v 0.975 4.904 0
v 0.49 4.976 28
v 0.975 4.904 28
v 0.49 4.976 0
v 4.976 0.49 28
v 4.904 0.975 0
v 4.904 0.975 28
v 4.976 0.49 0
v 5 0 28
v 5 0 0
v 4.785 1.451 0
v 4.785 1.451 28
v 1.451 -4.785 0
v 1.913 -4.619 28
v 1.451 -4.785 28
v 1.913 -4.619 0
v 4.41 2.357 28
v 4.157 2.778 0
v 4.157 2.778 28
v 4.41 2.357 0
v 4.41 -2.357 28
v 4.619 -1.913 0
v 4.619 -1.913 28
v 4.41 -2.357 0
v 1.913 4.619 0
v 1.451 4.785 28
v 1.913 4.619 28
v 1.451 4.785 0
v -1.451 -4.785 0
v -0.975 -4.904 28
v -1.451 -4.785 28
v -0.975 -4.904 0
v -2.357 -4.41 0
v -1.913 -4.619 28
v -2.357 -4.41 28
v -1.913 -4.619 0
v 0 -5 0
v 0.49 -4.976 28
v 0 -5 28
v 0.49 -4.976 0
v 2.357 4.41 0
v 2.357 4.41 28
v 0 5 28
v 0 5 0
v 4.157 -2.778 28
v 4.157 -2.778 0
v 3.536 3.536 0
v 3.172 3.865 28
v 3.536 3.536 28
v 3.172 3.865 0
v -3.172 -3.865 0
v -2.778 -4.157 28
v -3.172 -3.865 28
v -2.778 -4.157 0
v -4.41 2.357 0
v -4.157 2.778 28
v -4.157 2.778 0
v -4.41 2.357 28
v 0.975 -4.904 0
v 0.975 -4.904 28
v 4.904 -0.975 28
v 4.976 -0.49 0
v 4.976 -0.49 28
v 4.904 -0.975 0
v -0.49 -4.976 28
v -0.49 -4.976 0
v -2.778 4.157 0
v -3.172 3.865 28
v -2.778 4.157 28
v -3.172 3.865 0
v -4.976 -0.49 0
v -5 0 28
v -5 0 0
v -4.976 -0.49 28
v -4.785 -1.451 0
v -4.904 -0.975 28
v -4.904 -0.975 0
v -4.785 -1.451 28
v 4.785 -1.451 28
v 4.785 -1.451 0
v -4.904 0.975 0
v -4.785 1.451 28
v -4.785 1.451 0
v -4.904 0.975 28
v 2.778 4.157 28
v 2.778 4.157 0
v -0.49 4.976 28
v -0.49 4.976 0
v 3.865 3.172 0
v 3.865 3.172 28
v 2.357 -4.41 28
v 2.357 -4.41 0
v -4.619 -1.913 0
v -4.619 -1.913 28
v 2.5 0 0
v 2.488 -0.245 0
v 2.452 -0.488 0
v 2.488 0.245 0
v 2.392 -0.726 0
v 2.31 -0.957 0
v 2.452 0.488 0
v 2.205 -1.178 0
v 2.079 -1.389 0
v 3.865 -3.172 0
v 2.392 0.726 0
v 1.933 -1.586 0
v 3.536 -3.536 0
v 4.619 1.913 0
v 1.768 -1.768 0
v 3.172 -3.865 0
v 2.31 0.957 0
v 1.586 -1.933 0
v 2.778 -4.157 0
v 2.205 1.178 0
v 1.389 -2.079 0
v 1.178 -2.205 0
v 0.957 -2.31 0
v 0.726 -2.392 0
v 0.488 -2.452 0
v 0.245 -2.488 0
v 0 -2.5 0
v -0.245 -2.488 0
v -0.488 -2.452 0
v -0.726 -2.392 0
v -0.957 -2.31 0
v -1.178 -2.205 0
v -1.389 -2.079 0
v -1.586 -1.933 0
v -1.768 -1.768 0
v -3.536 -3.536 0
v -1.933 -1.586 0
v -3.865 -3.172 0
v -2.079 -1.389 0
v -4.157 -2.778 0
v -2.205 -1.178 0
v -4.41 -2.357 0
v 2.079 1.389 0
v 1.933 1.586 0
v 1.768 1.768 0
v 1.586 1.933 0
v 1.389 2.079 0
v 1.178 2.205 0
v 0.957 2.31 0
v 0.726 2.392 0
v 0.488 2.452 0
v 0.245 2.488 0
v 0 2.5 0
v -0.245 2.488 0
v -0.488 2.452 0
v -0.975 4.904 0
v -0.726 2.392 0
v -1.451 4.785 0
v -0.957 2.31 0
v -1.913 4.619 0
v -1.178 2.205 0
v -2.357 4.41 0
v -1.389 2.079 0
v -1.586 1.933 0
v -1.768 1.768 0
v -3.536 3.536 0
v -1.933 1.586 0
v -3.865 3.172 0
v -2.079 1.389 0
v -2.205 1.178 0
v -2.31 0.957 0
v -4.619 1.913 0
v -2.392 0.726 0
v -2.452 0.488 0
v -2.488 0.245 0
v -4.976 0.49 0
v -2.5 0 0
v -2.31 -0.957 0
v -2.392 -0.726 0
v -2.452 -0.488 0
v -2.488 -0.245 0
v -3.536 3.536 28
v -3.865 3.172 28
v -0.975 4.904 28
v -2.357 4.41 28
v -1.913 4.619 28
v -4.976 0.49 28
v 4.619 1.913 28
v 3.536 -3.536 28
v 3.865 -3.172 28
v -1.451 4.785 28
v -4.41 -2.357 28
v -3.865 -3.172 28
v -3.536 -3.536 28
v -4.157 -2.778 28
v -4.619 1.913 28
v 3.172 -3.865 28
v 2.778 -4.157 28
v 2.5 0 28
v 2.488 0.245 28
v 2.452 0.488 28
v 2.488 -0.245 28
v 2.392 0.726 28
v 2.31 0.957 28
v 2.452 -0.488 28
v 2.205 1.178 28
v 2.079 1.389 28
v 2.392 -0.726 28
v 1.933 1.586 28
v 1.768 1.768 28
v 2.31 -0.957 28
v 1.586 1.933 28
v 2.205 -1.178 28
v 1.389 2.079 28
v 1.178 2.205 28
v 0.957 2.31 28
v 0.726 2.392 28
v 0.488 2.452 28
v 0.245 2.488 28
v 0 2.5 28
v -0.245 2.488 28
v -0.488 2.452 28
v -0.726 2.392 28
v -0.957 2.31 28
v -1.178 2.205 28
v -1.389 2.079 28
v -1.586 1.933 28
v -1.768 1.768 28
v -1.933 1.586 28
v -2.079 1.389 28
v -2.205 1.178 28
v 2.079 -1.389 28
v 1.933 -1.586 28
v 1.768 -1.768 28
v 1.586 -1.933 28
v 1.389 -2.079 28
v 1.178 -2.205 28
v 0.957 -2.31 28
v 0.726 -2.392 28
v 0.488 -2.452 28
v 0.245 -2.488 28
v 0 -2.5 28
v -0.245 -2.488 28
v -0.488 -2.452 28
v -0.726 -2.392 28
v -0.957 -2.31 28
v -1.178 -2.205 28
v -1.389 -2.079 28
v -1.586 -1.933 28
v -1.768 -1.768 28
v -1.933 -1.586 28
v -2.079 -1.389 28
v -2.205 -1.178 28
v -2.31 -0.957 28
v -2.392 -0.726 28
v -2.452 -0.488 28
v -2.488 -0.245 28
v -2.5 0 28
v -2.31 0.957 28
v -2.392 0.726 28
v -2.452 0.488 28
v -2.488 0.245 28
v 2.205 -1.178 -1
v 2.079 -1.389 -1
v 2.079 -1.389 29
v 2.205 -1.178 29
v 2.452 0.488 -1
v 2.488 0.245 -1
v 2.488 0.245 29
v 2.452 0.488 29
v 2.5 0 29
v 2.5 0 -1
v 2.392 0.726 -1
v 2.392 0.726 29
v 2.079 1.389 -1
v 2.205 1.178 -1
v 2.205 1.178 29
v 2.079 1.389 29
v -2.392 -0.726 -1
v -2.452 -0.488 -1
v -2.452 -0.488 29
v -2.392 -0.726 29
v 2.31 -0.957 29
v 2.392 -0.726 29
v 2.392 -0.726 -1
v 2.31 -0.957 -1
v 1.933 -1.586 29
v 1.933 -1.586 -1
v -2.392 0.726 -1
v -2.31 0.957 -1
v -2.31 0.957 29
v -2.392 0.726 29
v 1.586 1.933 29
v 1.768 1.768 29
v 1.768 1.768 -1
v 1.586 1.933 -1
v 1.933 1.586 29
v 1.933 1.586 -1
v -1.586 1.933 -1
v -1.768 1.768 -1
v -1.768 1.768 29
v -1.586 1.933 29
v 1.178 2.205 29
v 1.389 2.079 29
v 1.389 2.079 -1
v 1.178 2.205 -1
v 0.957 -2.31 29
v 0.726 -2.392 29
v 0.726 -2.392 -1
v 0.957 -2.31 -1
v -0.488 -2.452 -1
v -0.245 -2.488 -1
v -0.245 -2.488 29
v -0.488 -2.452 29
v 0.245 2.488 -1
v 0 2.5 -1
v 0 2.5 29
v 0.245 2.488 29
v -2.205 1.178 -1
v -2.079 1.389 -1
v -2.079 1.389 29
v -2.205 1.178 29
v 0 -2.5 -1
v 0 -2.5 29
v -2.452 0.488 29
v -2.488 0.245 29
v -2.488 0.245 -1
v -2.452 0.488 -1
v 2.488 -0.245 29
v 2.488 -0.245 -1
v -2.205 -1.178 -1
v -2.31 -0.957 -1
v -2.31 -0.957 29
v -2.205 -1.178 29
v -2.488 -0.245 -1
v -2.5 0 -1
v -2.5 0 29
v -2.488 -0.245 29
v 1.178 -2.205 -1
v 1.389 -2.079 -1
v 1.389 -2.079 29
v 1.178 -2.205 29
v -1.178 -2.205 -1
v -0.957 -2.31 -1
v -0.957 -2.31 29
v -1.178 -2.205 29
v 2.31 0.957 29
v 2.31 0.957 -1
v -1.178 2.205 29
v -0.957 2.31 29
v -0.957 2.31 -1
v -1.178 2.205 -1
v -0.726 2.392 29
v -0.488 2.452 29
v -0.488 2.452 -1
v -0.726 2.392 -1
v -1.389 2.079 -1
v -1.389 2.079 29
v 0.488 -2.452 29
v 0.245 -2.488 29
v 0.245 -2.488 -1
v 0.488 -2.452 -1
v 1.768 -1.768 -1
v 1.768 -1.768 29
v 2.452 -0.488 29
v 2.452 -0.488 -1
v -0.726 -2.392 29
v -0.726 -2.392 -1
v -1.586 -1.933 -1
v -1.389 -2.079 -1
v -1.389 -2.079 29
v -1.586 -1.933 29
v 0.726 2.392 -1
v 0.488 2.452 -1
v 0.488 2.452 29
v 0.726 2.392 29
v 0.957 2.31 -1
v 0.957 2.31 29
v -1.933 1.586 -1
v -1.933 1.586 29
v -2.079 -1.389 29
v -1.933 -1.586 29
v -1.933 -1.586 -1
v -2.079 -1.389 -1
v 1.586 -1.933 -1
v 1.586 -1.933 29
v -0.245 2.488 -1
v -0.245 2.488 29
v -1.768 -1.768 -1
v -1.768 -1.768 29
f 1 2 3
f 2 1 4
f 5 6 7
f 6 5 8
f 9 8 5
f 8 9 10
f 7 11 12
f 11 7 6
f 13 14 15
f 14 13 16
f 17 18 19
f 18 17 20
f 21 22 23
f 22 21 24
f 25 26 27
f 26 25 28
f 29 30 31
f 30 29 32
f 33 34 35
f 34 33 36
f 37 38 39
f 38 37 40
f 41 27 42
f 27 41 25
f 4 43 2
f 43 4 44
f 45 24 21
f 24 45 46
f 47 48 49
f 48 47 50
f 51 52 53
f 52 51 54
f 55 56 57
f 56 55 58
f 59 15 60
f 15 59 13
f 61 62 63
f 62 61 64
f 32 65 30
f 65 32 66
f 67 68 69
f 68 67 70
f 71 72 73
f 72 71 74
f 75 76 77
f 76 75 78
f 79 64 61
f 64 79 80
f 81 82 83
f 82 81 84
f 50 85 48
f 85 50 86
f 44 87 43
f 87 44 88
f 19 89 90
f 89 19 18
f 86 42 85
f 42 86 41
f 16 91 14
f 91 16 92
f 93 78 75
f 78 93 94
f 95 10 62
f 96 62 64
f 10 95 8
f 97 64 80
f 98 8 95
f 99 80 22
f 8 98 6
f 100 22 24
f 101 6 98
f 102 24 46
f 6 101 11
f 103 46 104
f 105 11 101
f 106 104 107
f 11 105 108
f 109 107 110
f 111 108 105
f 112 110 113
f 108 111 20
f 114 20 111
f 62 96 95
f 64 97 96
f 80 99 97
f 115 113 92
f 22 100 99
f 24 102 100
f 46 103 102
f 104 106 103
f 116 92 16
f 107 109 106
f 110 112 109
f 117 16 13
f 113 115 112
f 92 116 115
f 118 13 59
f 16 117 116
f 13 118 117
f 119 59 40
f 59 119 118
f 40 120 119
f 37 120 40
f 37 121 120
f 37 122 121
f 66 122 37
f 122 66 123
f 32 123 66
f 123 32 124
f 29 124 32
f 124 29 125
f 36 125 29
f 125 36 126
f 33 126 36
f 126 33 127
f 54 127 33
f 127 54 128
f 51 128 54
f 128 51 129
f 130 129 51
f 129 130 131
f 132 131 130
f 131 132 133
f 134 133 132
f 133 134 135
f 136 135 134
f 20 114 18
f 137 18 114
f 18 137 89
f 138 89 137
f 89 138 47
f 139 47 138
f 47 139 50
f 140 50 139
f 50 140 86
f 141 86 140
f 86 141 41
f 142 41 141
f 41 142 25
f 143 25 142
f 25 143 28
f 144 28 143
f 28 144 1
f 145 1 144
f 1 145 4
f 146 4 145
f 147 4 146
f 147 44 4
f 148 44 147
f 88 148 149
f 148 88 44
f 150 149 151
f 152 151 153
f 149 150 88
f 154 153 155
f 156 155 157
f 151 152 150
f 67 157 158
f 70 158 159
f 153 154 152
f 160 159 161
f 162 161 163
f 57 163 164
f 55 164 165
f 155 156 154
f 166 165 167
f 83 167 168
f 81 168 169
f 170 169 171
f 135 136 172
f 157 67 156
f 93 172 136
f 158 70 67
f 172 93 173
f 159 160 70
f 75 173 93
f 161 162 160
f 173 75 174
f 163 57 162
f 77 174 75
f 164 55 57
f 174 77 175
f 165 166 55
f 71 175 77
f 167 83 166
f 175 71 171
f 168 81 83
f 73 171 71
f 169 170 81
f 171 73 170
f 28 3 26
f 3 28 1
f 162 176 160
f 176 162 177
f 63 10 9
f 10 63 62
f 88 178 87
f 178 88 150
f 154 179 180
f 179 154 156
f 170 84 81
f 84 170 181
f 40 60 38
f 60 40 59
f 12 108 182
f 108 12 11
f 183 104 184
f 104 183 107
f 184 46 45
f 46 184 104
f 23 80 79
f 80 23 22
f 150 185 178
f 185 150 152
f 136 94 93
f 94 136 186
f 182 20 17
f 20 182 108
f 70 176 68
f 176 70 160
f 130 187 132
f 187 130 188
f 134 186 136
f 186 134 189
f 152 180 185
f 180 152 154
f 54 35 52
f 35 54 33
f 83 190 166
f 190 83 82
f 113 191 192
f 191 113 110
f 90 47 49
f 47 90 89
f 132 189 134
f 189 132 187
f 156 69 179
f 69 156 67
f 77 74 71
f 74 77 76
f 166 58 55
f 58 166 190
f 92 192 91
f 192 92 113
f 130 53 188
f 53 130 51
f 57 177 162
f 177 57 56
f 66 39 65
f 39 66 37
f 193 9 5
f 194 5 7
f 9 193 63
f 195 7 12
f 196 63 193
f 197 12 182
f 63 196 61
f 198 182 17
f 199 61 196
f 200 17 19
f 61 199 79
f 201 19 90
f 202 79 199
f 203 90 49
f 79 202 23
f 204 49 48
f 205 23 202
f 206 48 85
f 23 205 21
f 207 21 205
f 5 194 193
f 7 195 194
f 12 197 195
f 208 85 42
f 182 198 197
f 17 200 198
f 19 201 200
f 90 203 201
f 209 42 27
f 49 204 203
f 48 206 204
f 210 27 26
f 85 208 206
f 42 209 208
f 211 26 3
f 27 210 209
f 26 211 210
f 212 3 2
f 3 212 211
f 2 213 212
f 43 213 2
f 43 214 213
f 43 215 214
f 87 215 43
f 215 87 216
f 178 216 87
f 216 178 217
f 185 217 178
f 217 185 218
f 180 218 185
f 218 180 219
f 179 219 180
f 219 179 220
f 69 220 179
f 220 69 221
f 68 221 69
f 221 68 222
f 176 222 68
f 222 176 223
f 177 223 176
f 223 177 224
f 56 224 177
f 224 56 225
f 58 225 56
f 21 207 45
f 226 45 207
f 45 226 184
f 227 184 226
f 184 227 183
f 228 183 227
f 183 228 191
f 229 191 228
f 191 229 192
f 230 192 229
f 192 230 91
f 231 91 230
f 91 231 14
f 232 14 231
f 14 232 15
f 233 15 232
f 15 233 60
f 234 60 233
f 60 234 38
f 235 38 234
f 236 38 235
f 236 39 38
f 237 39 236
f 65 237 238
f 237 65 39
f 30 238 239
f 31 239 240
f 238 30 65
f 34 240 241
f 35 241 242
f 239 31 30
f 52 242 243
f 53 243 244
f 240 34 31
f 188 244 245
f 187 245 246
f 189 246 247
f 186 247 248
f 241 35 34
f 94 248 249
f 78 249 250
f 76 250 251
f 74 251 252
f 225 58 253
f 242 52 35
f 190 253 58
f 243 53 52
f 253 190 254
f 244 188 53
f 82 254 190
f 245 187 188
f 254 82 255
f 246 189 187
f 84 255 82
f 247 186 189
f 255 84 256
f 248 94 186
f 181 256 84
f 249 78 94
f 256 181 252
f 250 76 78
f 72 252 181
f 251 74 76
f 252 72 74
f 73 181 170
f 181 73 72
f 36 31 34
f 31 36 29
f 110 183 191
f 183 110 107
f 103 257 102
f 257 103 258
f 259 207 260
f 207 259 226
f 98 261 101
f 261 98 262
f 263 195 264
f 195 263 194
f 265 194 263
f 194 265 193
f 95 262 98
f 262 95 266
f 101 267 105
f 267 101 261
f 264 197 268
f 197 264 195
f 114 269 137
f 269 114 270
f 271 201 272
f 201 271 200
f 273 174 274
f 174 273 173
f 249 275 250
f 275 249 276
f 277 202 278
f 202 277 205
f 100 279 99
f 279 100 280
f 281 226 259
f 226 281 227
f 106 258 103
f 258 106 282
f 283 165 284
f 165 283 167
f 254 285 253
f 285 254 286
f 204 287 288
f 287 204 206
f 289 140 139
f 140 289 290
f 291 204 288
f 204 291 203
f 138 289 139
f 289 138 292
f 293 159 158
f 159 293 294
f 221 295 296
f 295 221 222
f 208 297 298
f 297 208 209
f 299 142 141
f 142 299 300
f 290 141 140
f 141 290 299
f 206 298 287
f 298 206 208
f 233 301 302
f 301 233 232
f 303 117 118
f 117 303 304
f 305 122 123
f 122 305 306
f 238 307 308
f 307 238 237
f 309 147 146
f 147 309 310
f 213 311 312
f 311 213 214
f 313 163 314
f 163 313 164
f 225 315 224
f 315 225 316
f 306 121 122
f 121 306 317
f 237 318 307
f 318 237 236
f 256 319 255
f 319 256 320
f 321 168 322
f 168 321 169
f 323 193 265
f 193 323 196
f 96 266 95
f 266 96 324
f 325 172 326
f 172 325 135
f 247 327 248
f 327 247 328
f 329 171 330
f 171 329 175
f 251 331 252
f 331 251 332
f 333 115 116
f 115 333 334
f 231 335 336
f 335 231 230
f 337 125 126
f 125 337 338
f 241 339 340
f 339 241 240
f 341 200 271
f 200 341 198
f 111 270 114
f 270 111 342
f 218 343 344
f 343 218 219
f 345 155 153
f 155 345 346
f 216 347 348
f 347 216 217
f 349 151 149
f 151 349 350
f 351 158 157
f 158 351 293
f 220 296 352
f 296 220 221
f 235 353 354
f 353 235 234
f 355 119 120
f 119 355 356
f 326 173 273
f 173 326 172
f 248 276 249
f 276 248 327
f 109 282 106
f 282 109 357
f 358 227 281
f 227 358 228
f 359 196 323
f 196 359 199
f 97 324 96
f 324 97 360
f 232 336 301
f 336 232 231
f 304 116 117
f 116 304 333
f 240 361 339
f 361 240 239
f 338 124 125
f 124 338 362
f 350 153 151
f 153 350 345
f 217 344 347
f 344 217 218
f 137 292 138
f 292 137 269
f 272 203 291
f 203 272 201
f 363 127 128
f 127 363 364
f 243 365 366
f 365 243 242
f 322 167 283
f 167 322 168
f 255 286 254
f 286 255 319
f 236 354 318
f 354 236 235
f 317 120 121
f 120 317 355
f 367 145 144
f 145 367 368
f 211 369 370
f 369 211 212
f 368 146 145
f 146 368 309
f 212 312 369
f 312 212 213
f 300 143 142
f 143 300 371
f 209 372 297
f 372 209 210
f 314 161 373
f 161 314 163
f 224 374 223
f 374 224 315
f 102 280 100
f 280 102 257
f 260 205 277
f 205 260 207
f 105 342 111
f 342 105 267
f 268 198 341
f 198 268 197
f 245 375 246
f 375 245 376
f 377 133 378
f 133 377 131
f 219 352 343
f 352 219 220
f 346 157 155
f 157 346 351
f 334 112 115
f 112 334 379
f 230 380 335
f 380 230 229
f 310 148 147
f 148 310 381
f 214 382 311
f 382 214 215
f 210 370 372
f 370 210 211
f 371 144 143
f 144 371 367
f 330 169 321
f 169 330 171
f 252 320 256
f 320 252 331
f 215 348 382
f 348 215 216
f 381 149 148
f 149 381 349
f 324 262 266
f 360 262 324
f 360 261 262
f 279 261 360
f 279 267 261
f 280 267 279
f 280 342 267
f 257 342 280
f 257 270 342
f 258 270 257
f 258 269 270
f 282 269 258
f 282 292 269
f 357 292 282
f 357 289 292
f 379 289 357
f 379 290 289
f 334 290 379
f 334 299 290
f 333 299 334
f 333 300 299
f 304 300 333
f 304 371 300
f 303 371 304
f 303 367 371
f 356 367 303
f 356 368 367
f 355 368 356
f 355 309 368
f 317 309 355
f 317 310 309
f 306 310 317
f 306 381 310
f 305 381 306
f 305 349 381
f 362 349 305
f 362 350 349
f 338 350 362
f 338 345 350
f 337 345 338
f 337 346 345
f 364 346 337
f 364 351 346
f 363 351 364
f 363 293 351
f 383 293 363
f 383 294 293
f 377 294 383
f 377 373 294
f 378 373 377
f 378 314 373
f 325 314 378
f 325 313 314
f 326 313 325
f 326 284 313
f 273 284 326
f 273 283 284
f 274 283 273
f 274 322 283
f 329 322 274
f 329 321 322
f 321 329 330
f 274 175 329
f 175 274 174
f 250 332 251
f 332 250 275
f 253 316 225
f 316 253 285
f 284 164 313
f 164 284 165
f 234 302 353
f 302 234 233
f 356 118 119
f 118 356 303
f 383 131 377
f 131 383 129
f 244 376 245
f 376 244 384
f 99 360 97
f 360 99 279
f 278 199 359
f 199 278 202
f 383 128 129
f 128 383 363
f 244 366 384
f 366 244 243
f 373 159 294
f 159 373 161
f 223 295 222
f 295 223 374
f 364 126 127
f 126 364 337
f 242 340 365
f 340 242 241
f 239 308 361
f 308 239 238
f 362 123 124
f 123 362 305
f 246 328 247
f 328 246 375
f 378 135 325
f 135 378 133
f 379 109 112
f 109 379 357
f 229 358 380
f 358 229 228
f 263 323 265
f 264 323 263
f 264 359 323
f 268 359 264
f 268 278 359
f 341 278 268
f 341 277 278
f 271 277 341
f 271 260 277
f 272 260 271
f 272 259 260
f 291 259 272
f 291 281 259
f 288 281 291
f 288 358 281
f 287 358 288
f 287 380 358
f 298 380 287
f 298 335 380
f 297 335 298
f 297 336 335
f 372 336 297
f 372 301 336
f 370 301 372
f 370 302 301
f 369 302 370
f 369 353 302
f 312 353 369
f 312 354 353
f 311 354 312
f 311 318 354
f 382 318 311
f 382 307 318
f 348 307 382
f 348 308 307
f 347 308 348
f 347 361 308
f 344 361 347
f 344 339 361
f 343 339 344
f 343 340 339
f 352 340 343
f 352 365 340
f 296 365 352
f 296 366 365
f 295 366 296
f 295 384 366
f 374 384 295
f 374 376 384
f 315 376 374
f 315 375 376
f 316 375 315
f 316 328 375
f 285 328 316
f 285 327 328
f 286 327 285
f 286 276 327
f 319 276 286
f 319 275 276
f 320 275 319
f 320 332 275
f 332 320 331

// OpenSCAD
cylinder(h=28.0, d=10.0, $fn=64);
translate([0, 0, -1])
cylinder(h=30.0, d=5.0, $fn=64);
